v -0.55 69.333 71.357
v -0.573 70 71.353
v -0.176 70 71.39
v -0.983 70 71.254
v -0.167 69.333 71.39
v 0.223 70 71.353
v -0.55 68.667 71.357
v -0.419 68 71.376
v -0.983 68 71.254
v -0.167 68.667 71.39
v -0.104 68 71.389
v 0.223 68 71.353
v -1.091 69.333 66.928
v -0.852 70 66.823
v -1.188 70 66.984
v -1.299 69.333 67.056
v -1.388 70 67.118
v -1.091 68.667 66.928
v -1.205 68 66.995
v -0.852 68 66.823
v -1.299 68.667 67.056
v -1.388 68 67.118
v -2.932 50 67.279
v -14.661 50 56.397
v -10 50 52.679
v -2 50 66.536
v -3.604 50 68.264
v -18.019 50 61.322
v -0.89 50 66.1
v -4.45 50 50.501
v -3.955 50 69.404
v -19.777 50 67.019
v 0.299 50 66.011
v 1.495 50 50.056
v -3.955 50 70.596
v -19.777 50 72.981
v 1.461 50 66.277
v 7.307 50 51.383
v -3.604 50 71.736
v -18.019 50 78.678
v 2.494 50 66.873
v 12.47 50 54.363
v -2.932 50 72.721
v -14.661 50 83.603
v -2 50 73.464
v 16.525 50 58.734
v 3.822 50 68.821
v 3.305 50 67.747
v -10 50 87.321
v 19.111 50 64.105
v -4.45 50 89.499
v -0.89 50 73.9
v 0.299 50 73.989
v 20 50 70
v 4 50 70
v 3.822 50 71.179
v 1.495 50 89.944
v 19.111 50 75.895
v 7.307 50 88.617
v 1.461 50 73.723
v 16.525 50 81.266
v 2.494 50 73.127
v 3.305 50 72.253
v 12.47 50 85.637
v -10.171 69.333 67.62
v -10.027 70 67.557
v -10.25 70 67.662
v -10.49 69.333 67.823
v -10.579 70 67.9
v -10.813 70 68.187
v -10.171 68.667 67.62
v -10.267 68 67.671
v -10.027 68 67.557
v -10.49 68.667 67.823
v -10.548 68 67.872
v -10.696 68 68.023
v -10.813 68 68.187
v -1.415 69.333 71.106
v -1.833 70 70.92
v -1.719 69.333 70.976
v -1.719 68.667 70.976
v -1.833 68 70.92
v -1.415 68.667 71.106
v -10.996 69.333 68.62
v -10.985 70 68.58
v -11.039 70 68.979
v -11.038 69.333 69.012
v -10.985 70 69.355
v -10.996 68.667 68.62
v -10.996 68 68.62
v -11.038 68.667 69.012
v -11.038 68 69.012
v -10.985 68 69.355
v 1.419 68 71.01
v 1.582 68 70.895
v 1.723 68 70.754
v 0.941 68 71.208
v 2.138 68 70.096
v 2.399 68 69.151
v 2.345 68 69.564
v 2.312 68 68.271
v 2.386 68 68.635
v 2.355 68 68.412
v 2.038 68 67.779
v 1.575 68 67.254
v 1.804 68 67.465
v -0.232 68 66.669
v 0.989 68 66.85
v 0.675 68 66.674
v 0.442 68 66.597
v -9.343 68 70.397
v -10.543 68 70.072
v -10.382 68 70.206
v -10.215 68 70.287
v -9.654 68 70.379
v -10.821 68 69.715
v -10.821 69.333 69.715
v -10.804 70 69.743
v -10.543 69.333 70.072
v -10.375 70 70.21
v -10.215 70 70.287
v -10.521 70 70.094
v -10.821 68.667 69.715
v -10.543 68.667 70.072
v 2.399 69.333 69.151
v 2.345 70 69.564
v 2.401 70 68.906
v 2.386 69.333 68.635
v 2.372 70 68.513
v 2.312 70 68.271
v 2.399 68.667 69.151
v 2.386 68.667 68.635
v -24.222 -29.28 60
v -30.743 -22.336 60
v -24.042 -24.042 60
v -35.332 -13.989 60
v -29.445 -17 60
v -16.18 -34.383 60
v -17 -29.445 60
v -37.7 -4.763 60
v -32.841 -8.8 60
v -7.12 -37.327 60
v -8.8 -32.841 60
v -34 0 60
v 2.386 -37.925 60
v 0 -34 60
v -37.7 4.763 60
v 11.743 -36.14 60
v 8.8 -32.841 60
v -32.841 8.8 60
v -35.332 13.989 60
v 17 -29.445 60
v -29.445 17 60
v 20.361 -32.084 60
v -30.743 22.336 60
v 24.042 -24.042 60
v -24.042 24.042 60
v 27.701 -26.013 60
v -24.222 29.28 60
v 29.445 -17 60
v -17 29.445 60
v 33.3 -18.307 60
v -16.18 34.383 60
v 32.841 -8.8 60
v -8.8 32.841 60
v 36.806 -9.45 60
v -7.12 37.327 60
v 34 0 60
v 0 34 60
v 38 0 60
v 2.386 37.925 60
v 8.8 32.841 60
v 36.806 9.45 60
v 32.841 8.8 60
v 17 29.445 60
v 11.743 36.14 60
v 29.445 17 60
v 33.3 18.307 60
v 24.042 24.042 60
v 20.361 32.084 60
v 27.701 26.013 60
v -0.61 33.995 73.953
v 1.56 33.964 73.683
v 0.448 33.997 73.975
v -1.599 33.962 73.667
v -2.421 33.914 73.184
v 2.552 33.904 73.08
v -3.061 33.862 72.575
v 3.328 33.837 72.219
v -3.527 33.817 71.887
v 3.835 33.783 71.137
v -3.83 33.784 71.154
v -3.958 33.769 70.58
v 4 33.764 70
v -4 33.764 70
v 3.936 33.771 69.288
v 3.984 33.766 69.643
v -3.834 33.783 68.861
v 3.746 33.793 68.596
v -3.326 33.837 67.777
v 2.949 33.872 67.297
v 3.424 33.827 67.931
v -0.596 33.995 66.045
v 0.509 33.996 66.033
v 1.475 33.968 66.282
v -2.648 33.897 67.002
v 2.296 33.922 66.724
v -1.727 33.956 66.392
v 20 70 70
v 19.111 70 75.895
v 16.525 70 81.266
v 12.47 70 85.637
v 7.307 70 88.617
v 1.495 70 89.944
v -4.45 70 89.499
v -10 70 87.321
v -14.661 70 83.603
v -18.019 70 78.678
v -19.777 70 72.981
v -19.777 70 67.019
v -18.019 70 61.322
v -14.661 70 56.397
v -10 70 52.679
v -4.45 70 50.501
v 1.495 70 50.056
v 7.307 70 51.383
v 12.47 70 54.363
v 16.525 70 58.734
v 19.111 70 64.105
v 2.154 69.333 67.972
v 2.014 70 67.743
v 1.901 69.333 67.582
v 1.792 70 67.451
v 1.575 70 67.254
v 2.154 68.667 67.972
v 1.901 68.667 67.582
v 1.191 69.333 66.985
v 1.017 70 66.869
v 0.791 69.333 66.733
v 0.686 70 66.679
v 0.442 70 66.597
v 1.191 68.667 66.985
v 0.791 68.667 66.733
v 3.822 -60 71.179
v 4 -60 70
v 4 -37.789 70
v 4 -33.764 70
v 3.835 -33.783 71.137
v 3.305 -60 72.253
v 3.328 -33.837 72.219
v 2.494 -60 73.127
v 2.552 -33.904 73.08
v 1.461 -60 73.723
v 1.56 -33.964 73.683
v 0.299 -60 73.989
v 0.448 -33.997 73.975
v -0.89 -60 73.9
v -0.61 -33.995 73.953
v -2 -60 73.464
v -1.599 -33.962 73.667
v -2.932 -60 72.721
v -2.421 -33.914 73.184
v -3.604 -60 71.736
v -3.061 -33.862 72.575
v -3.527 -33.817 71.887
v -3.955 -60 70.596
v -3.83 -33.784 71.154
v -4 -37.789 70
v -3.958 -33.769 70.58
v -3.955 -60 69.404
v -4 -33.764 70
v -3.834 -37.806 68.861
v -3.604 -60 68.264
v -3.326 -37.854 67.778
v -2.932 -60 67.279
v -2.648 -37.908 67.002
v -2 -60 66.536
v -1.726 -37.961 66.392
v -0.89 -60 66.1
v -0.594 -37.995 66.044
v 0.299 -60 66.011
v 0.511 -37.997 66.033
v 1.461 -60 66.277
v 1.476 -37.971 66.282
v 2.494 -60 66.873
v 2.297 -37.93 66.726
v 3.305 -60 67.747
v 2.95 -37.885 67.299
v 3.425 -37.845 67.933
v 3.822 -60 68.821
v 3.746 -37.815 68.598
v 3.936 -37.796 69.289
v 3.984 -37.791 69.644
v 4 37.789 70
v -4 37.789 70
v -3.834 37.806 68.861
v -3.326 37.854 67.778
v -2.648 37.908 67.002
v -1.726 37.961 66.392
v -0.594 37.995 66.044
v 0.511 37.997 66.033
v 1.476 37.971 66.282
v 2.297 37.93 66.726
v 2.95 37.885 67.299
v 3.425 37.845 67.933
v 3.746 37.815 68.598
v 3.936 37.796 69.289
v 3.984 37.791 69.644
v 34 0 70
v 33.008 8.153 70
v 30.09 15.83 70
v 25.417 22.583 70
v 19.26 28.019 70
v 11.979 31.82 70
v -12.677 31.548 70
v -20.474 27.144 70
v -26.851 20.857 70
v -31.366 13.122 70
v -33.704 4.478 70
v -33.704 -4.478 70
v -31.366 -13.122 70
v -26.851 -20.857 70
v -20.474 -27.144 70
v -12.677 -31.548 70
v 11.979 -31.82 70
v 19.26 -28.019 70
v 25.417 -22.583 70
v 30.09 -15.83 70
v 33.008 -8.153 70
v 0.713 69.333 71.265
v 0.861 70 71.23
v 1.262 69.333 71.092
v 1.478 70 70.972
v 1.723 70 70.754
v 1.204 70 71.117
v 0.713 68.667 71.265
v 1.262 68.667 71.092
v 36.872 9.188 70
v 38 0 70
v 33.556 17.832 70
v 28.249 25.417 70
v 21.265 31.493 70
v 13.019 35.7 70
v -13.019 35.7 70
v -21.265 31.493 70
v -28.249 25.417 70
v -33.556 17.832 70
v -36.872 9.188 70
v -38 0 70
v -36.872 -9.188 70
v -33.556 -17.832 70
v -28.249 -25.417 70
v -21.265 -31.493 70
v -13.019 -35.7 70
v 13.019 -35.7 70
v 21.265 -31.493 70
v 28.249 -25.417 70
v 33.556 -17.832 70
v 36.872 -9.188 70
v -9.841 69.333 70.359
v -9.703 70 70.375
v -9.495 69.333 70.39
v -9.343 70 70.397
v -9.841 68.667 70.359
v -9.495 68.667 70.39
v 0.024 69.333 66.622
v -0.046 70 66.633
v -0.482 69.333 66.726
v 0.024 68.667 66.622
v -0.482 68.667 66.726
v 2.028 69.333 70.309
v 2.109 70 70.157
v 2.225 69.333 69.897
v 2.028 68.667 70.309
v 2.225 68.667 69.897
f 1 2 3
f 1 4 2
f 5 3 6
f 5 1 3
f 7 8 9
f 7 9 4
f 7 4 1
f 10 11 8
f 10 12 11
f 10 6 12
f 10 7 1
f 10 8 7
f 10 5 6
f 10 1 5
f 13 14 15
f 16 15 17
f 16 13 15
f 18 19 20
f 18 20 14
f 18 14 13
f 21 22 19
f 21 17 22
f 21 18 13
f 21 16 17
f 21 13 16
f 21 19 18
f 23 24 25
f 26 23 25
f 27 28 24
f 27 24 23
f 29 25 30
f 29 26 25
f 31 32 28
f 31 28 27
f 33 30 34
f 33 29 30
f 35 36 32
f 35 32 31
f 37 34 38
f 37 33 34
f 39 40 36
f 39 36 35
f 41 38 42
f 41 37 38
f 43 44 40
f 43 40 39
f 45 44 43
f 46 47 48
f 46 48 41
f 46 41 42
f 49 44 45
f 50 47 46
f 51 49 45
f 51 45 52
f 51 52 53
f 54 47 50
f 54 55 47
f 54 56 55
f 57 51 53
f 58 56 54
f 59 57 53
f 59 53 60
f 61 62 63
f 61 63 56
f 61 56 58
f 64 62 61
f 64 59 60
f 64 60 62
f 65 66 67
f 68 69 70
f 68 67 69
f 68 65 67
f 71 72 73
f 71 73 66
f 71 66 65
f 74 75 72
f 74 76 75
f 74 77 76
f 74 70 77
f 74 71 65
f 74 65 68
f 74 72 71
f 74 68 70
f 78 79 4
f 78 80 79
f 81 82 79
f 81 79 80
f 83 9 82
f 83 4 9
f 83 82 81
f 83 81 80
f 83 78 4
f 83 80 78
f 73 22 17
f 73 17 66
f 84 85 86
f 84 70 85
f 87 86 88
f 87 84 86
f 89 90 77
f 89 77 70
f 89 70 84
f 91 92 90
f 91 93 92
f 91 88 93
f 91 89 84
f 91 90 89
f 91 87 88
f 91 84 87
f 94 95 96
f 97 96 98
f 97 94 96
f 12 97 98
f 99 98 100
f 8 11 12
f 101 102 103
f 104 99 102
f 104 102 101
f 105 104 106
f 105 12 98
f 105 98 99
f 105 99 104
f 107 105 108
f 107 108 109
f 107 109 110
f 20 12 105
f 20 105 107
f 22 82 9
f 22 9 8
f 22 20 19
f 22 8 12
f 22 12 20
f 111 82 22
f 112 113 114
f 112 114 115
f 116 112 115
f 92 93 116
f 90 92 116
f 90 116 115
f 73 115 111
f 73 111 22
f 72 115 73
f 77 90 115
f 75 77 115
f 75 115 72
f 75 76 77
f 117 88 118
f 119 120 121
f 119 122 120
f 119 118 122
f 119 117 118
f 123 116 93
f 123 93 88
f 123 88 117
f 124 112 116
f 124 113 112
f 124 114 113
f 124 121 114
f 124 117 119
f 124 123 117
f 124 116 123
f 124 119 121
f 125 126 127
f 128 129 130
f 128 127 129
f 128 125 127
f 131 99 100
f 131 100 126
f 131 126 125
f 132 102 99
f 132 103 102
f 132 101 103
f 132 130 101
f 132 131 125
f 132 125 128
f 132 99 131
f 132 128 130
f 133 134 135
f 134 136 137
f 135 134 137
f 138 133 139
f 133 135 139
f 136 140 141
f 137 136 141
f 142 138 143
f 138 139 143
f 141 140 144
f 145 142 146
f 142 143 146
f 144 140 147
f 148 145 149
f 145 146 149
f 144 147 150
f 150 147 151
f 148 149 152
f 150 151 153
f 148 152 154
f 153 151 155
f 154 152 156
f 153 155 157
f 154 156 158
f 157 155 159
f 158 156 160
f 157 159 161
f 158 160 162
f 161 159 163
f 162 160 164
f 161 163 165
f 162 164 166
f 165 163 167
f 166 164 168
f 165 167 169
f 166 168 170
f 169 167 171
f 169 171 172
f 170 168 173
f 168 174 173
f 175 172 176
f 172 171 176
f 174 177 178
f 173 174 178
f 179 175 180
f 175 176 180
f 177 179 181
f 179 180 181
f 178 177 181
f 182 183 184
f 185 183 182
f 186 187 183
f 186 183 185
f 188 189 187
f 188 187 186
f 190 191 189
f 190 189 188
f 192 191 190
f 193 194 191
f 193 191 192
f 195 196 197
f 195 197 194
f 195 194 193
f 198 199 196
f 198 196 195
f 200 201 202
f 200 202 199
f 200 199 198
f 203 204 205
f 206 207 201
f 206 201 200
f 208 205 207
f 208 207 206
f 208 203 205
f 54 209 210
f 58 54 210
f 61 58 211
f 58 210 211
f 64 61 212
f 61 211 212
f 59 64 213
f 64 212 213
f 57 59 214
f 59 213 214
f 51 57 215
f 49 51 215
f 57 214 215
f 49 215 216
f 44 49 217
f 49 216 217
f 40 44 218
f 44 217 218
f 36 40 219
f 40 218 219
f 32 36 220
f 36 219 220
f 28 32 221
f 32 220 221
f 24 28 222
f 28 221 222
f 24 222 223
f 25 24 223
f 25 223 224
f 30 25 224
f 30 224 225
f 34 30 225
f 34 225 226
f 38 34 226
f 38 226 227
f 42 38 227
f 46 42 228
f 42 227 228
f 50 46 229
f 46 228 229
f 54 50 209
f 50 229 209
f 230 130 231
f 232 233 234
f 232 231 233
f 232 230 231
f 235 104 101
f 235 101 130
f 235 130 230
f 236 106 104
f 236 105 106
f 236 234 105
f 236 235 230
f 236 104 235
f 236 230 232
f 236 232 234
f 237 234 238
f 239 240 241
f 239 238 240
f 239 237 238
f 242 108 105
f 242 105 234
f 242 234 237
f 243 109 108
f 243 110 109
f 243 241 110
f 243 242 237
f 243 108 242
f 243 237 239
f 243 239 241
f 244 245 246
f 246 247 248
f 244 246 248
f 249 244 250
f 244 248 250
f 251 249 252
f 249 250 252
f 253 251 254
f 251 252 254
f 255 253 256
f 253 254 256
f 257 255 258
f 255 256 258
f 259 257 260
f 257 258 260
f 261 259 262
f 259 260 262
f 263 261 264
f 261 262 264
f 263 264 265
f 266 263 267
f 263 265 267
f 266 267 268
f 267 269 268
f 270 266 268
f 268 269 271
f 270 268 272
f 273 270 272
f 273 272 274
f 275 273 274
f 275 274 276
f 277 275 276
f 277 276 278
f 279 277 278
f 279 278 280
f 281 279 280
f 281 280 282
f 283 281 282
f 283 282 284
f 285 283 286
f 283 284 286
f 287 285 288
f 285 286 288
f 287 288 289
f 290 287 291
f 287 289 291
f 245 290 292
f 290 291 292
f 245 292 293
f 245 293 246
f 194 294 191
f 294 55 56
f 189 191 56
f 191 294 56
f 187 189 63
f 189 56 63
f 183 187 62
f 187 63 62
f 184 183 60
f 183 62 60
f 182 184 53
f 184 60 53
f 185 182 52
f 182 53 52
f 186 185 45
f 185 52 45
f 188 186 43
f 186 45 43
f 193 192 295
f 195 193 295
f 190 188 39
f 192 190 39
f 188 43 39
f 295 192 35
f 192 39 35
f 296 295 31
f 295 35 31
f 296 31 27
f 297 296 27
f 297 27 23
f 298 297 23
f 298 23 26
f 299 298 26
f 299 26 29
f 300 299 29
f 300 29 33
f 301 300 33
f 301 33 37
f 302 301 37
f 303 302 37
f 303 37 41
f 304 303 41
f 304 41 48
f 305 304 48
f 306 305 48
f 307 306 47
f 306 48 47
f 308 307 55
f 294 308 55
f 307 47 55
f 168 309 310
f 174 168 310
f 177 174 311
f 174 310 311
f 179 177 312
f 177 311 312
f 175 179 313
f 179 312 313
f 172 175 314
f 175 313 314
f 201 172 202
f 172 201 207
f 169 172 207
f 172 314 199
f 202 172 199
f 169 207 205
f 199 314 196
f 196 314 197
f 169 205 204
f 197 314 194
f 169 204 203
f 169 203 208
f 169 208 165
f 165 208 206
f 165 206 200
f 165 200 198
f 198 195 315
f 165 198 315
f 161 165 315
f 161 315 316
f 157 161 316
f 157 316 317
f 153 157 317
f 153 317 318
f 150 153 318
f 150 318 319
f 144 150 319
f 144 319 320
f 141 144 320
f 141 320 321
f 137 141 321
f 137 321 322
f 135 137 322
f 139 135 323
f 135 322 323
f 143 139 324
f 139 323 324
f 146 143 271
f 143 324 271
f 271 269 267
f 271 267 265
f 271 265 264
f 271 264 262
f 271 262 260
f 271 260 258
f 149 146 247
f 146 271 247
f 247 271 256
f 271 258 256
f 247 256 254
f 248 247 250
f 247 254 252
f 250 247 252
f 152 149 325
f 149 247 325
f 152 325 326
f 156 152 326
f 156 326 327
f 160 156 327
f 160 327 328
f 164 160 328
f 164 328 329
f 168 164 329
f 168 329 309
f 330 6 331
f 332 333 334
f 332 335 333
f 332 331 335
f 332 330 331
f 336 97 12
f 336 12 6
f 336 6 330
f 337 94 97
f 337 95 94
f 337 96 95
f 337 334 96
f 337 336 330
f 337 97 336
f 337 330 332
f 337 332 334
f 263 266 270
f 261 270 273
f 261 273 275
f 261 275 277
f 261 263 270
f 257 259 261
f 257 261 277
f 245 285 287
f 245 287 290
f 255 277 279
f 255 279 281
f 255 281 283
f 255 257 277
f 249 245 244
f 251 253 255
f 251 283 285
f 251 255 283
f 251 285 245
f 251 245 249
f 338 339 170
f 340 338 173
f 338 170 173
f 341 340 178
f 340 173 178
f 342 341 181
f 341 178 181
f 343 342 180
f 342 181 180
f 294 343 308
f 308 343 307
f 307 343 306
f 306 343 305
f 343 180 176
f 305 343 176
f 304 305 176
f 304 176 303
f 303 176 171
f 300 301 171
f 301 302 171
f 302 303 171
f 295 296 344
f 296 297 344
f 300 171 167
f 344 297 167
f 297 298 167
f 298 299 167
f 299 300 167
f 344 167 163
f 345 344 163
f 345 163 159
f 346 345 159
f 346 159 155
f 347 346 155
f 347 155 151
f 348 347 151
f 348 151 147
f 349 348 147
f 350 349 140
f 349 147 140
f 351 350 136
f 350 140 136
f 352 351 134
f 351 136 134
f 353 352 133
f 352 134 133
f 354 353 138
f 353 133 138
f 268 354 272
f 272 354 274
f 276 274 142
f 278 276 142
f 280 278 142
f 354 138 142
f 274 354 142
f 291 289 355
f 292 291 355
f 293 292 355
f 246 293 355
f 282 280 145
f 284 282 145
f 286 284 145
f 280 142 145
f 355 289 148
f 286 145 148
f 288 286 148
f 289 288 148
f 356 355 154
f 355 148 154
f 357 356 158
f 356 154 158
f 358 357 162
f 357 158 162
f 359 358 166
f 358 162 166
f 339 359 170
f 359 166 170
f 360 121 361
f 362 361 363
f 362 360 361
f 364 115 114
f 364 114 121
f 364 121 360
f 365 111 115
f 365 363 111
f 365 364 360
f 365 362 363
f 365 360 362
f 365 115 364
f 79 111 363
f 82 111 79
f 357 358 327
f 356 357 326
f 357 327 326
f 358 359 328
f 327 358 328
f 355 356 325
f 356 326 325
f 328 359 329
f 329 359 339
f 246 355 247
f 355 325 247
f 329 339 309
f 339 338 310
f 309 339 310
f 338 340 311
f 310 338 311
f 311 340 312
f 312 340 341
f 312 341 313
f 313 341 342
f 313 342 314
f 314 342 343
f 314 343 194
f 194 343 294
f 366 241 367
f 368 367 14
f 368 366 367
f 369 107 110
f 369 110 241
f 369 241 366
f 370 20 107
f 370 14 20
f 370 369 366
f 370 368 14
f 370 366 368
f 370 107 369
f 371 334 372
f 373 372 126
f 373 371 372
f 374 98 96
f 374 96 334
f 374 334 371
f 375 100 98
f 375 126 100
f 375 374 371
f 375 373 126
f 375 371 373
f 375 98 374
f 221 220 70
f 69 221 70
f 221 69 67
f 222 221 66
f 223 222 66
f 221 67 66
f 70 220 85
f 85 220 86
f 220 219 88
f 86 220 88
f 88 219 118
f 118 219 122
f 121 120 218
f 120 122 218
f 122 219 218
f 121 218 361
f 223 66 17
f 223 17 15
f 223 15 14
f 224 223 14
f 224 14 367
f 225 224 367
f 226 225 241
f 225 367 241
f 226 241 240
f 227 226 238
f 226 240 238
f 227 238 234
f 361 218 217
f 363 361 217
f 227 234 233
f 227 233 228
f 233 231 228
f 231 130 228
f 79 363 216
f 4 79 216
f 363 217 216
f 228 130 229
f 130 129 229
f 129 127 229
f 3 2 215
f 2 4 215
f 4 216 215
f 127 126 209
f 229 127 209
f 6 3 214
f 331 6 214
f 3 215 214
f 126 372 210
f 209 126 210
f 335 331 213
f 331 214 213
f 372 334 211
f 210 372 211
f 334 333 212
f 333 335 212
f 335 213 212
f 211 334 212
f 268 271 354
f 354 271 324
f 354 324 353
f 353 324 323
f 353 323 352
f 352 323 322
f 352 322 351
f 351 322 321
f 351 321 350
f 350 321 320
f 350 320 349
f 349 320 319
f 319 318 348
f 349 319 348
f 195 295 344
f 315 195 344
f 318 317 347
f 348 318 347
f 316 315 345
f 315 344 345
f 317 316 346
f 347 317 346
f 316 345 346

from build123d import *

# Parameters (mm, degrees)
EXTRUDE_DEPTH           = 10
EXTRUDE_PLACEMENT_ANGLE = 270
CYLINDER004_R           = 34
CYLINDER004_DEPTH       = 30
CYLINDER003_R           = 4
CYLINDER003_DEPTH       = 120
CYLINDER005_R           = 20
CYLINDER005_DEPTH       = 20
CYLINDER_R              = 46
CYLINDER_DEPTH          = 60


with BuildPart() as extrude_body:
    # path2399 → Extrude (new body)
    with BuildSketch(Plane(origin=(8.682374, 337.01873, 81), x_dir=(0, 1, 0), z_dir=(0, 0, 1))):
        with BuildLine():
            add(Edge.make_bspline(
                [(-1.415579, 5.024931), (-1.938341, -2.484397)],
                knots=[0, 0, 7.527502, 7.527502], degree=1))
            add(Edge.make_bspline(
                [(-1.938341, -2.484397), (-1.938341, -2.484397), (-2.134903, -2.858259), (-2.273136, -3.334737)],
                knots=[0, 0, 0, 0, 1, 1, 1, 1], degree=3))
            add(Edge.make_bspline(
                [(-2.273136, -3.334737), (-2.411369, -3.811216), (-2.443203, -4.128926), (-2.371685, -4.540758)],
                knots=[0, 0, 0, 0, 1, 1, 1, 1], degree=3))
            add(Edge.make_bspline(
                [(-2.371685, -4.540758), (-2.300167, -4.952591), (-2.218933, -5.672599), (-1.772797, -6.040394)],
                knots=[0, 0, 0, 0, 1, 1, 1, 1], degree=3))
            add(Edge.make_bspline(
                [(-1.772797, -6.040394), (-1.326661, -6.40819), (-0.861351, -6.572675), (-0.583202, -6.662312)],
                knots=[0, 0, 0, 0, 1, 1, 1, 1], degree=3))
            add(Edge.make_bspline(
                [(-0.583202, -6.662312), (-0.305053, -6.751952), (0.507781, -6.731952), (0.709843, -6.630052)],
                knots=[0, 0, 0, 0, 1, 1, 1, 1], degree=3))
            add(Edge.make_bspline(
                [(0.709843, -6.630052), (0.911905, -6.52815), (1.481843, -6.245909), (1.726833, -5.892641)],
                knots=[0, 0, 0, 0, 1, 1, 1, 1], degree=3))
            add(Edge.make_bspline(
                [(1.726833, -5.892641), (1.971823, -5.539373), (2.340182, -5.059724), (2.384256, -4.759981)],
                knots=[0, 0, 0, 0, 1, 1, 1, 1], degree=3))
            add(Edge.make_bspline(
                [(2.384256, -4.759981), (2.42833, -4.460237), (2.223091, -3.691858), (2.158411, -3.465999)],
                knots=[0, 0, 0, 0, 1, 1, 1, 1], degree=3))
            add(Edge.make_bspline(
                [(2.158411, -3.465999), (2.093732, -3.240141), (1.863634, -2.929328), (1.863634, -2.929328)],
                knots=[0, 0, 0, 0, 1, 1, 1, 1], degree=3))
            add(Edge.make_bspline(
                [(1.863634, -2.929328), (1.423808, 5.709855)],
                knots=[0, 0, 8.650371, 8.650371], degree=1))
            add(Edge.make_bspline(
                [(1.423808, 5.709855), (1.423808, 5.709855), (1.246198, 6.226563), (0.794563, 6.495307)],
                knots=[0, 0, 0, 0, 1, 1, 1, 1], degree=3))
            add(Edge.make_bspline(
                [(0.794563, 6.495307), (0.342929, 6.764051), (-0.057622, 6.753041), (-0.37358, 6.666974)],
                knots=[0, 0, 0, 0, 1, 1, 1, 1], degree=3))
            add(Edge.make_bspline(
                [(-0.37358, 6.666974), (-0.689538, 6.580907), (-1.208145, 6.230265), (-1.306201, 5.897514)],
                knots=[0, 0, 0, 0, 1, 1, 1, 1], degree=3))
            add(Edge.make_bspline(
                [(-1.306201, 5.897514), (-1.404257, 5.564763), (-1.415579, 5.024931), (-1.415579, 5.024931)],
                knots=[0, 0, 0, 0, 1, 1, 1, 1], degree=3))
        make_face()
    extrude(amount=EXTRUDE_DEPTH)


with BuildPart() as extrude_body_1:
    # Extrude placement: moved
    add(extrude_body.part.moved(Location((-13, -13, 406))).rotate(Axis((-13, -13, 406), (1, 0, 0)), EXTRUDE_PLACEMENT_ANGLE))


with BuildPart() as cylinder004:
    # Cylinder004 → Cylinder004 (new body)
    with BuildSketch(Plane.XY.offset(56)):
        Circle(CYLINDER004_R)
    extrude(amount=CYLINDER004_DEPTH)


with BuildPart() as cut:
    # Cylinder003 → Cylinder003 (new body)
    with BuildSketch(Plane(origin=(0, 60, 70), x_dir=(1, 0, 0), z_dir=(0, -1, 0))):
        Circle(CYLINDER003_R)
    extrude(amount=CYLINDER003_DEPTH)

    # Cut: cut Cylinder004
    add(cylinder004.part, mode=Mode.SUBTRACT)


with BuildPart() as cut001:
    # Cylinder005 → Cylinder005 (new body)
    with BuildSketch(Plane(origin=(0, 70, 70), x_dir=(1, 0, 0), z_dir=(0, -1, 0))):
        Circle(CYLINDER005_R)
    extrude(amount=CYLINDER005_DEPTH)

    # Fusion: union Cut
    add(cut.part)

    # Cut001: cut Extrude body
    add(extrude_body_1.part, mode=Mode.SUBTRACT)


with BuildPart() as cylinder:
    # Cylinder → Cylinder (new body)
    with BuildSketch(Plane.XY):
        Circle(CYLINDER_R)
    extrude(amount=CYLINDER_DEPTH)


with BuildPart() as fusion001:
    # Sketch → Revolve (revolve)
    with BuildSketch(Plane.XZ):
        Polygon((0, 1), (34, 1), (34, 70), (38, 70), (38, 0), (0, 0), align=None)
    revolve(axis=Axis((0, 0, 0), (0, 0, 1)))

    # Cut002: cut Cylinder
    add(cylinder.part, mode=Mode.SUBTRACT)

    # Fusion001: union Cut001
    add(cut001.part)


solid = fusion001.part
